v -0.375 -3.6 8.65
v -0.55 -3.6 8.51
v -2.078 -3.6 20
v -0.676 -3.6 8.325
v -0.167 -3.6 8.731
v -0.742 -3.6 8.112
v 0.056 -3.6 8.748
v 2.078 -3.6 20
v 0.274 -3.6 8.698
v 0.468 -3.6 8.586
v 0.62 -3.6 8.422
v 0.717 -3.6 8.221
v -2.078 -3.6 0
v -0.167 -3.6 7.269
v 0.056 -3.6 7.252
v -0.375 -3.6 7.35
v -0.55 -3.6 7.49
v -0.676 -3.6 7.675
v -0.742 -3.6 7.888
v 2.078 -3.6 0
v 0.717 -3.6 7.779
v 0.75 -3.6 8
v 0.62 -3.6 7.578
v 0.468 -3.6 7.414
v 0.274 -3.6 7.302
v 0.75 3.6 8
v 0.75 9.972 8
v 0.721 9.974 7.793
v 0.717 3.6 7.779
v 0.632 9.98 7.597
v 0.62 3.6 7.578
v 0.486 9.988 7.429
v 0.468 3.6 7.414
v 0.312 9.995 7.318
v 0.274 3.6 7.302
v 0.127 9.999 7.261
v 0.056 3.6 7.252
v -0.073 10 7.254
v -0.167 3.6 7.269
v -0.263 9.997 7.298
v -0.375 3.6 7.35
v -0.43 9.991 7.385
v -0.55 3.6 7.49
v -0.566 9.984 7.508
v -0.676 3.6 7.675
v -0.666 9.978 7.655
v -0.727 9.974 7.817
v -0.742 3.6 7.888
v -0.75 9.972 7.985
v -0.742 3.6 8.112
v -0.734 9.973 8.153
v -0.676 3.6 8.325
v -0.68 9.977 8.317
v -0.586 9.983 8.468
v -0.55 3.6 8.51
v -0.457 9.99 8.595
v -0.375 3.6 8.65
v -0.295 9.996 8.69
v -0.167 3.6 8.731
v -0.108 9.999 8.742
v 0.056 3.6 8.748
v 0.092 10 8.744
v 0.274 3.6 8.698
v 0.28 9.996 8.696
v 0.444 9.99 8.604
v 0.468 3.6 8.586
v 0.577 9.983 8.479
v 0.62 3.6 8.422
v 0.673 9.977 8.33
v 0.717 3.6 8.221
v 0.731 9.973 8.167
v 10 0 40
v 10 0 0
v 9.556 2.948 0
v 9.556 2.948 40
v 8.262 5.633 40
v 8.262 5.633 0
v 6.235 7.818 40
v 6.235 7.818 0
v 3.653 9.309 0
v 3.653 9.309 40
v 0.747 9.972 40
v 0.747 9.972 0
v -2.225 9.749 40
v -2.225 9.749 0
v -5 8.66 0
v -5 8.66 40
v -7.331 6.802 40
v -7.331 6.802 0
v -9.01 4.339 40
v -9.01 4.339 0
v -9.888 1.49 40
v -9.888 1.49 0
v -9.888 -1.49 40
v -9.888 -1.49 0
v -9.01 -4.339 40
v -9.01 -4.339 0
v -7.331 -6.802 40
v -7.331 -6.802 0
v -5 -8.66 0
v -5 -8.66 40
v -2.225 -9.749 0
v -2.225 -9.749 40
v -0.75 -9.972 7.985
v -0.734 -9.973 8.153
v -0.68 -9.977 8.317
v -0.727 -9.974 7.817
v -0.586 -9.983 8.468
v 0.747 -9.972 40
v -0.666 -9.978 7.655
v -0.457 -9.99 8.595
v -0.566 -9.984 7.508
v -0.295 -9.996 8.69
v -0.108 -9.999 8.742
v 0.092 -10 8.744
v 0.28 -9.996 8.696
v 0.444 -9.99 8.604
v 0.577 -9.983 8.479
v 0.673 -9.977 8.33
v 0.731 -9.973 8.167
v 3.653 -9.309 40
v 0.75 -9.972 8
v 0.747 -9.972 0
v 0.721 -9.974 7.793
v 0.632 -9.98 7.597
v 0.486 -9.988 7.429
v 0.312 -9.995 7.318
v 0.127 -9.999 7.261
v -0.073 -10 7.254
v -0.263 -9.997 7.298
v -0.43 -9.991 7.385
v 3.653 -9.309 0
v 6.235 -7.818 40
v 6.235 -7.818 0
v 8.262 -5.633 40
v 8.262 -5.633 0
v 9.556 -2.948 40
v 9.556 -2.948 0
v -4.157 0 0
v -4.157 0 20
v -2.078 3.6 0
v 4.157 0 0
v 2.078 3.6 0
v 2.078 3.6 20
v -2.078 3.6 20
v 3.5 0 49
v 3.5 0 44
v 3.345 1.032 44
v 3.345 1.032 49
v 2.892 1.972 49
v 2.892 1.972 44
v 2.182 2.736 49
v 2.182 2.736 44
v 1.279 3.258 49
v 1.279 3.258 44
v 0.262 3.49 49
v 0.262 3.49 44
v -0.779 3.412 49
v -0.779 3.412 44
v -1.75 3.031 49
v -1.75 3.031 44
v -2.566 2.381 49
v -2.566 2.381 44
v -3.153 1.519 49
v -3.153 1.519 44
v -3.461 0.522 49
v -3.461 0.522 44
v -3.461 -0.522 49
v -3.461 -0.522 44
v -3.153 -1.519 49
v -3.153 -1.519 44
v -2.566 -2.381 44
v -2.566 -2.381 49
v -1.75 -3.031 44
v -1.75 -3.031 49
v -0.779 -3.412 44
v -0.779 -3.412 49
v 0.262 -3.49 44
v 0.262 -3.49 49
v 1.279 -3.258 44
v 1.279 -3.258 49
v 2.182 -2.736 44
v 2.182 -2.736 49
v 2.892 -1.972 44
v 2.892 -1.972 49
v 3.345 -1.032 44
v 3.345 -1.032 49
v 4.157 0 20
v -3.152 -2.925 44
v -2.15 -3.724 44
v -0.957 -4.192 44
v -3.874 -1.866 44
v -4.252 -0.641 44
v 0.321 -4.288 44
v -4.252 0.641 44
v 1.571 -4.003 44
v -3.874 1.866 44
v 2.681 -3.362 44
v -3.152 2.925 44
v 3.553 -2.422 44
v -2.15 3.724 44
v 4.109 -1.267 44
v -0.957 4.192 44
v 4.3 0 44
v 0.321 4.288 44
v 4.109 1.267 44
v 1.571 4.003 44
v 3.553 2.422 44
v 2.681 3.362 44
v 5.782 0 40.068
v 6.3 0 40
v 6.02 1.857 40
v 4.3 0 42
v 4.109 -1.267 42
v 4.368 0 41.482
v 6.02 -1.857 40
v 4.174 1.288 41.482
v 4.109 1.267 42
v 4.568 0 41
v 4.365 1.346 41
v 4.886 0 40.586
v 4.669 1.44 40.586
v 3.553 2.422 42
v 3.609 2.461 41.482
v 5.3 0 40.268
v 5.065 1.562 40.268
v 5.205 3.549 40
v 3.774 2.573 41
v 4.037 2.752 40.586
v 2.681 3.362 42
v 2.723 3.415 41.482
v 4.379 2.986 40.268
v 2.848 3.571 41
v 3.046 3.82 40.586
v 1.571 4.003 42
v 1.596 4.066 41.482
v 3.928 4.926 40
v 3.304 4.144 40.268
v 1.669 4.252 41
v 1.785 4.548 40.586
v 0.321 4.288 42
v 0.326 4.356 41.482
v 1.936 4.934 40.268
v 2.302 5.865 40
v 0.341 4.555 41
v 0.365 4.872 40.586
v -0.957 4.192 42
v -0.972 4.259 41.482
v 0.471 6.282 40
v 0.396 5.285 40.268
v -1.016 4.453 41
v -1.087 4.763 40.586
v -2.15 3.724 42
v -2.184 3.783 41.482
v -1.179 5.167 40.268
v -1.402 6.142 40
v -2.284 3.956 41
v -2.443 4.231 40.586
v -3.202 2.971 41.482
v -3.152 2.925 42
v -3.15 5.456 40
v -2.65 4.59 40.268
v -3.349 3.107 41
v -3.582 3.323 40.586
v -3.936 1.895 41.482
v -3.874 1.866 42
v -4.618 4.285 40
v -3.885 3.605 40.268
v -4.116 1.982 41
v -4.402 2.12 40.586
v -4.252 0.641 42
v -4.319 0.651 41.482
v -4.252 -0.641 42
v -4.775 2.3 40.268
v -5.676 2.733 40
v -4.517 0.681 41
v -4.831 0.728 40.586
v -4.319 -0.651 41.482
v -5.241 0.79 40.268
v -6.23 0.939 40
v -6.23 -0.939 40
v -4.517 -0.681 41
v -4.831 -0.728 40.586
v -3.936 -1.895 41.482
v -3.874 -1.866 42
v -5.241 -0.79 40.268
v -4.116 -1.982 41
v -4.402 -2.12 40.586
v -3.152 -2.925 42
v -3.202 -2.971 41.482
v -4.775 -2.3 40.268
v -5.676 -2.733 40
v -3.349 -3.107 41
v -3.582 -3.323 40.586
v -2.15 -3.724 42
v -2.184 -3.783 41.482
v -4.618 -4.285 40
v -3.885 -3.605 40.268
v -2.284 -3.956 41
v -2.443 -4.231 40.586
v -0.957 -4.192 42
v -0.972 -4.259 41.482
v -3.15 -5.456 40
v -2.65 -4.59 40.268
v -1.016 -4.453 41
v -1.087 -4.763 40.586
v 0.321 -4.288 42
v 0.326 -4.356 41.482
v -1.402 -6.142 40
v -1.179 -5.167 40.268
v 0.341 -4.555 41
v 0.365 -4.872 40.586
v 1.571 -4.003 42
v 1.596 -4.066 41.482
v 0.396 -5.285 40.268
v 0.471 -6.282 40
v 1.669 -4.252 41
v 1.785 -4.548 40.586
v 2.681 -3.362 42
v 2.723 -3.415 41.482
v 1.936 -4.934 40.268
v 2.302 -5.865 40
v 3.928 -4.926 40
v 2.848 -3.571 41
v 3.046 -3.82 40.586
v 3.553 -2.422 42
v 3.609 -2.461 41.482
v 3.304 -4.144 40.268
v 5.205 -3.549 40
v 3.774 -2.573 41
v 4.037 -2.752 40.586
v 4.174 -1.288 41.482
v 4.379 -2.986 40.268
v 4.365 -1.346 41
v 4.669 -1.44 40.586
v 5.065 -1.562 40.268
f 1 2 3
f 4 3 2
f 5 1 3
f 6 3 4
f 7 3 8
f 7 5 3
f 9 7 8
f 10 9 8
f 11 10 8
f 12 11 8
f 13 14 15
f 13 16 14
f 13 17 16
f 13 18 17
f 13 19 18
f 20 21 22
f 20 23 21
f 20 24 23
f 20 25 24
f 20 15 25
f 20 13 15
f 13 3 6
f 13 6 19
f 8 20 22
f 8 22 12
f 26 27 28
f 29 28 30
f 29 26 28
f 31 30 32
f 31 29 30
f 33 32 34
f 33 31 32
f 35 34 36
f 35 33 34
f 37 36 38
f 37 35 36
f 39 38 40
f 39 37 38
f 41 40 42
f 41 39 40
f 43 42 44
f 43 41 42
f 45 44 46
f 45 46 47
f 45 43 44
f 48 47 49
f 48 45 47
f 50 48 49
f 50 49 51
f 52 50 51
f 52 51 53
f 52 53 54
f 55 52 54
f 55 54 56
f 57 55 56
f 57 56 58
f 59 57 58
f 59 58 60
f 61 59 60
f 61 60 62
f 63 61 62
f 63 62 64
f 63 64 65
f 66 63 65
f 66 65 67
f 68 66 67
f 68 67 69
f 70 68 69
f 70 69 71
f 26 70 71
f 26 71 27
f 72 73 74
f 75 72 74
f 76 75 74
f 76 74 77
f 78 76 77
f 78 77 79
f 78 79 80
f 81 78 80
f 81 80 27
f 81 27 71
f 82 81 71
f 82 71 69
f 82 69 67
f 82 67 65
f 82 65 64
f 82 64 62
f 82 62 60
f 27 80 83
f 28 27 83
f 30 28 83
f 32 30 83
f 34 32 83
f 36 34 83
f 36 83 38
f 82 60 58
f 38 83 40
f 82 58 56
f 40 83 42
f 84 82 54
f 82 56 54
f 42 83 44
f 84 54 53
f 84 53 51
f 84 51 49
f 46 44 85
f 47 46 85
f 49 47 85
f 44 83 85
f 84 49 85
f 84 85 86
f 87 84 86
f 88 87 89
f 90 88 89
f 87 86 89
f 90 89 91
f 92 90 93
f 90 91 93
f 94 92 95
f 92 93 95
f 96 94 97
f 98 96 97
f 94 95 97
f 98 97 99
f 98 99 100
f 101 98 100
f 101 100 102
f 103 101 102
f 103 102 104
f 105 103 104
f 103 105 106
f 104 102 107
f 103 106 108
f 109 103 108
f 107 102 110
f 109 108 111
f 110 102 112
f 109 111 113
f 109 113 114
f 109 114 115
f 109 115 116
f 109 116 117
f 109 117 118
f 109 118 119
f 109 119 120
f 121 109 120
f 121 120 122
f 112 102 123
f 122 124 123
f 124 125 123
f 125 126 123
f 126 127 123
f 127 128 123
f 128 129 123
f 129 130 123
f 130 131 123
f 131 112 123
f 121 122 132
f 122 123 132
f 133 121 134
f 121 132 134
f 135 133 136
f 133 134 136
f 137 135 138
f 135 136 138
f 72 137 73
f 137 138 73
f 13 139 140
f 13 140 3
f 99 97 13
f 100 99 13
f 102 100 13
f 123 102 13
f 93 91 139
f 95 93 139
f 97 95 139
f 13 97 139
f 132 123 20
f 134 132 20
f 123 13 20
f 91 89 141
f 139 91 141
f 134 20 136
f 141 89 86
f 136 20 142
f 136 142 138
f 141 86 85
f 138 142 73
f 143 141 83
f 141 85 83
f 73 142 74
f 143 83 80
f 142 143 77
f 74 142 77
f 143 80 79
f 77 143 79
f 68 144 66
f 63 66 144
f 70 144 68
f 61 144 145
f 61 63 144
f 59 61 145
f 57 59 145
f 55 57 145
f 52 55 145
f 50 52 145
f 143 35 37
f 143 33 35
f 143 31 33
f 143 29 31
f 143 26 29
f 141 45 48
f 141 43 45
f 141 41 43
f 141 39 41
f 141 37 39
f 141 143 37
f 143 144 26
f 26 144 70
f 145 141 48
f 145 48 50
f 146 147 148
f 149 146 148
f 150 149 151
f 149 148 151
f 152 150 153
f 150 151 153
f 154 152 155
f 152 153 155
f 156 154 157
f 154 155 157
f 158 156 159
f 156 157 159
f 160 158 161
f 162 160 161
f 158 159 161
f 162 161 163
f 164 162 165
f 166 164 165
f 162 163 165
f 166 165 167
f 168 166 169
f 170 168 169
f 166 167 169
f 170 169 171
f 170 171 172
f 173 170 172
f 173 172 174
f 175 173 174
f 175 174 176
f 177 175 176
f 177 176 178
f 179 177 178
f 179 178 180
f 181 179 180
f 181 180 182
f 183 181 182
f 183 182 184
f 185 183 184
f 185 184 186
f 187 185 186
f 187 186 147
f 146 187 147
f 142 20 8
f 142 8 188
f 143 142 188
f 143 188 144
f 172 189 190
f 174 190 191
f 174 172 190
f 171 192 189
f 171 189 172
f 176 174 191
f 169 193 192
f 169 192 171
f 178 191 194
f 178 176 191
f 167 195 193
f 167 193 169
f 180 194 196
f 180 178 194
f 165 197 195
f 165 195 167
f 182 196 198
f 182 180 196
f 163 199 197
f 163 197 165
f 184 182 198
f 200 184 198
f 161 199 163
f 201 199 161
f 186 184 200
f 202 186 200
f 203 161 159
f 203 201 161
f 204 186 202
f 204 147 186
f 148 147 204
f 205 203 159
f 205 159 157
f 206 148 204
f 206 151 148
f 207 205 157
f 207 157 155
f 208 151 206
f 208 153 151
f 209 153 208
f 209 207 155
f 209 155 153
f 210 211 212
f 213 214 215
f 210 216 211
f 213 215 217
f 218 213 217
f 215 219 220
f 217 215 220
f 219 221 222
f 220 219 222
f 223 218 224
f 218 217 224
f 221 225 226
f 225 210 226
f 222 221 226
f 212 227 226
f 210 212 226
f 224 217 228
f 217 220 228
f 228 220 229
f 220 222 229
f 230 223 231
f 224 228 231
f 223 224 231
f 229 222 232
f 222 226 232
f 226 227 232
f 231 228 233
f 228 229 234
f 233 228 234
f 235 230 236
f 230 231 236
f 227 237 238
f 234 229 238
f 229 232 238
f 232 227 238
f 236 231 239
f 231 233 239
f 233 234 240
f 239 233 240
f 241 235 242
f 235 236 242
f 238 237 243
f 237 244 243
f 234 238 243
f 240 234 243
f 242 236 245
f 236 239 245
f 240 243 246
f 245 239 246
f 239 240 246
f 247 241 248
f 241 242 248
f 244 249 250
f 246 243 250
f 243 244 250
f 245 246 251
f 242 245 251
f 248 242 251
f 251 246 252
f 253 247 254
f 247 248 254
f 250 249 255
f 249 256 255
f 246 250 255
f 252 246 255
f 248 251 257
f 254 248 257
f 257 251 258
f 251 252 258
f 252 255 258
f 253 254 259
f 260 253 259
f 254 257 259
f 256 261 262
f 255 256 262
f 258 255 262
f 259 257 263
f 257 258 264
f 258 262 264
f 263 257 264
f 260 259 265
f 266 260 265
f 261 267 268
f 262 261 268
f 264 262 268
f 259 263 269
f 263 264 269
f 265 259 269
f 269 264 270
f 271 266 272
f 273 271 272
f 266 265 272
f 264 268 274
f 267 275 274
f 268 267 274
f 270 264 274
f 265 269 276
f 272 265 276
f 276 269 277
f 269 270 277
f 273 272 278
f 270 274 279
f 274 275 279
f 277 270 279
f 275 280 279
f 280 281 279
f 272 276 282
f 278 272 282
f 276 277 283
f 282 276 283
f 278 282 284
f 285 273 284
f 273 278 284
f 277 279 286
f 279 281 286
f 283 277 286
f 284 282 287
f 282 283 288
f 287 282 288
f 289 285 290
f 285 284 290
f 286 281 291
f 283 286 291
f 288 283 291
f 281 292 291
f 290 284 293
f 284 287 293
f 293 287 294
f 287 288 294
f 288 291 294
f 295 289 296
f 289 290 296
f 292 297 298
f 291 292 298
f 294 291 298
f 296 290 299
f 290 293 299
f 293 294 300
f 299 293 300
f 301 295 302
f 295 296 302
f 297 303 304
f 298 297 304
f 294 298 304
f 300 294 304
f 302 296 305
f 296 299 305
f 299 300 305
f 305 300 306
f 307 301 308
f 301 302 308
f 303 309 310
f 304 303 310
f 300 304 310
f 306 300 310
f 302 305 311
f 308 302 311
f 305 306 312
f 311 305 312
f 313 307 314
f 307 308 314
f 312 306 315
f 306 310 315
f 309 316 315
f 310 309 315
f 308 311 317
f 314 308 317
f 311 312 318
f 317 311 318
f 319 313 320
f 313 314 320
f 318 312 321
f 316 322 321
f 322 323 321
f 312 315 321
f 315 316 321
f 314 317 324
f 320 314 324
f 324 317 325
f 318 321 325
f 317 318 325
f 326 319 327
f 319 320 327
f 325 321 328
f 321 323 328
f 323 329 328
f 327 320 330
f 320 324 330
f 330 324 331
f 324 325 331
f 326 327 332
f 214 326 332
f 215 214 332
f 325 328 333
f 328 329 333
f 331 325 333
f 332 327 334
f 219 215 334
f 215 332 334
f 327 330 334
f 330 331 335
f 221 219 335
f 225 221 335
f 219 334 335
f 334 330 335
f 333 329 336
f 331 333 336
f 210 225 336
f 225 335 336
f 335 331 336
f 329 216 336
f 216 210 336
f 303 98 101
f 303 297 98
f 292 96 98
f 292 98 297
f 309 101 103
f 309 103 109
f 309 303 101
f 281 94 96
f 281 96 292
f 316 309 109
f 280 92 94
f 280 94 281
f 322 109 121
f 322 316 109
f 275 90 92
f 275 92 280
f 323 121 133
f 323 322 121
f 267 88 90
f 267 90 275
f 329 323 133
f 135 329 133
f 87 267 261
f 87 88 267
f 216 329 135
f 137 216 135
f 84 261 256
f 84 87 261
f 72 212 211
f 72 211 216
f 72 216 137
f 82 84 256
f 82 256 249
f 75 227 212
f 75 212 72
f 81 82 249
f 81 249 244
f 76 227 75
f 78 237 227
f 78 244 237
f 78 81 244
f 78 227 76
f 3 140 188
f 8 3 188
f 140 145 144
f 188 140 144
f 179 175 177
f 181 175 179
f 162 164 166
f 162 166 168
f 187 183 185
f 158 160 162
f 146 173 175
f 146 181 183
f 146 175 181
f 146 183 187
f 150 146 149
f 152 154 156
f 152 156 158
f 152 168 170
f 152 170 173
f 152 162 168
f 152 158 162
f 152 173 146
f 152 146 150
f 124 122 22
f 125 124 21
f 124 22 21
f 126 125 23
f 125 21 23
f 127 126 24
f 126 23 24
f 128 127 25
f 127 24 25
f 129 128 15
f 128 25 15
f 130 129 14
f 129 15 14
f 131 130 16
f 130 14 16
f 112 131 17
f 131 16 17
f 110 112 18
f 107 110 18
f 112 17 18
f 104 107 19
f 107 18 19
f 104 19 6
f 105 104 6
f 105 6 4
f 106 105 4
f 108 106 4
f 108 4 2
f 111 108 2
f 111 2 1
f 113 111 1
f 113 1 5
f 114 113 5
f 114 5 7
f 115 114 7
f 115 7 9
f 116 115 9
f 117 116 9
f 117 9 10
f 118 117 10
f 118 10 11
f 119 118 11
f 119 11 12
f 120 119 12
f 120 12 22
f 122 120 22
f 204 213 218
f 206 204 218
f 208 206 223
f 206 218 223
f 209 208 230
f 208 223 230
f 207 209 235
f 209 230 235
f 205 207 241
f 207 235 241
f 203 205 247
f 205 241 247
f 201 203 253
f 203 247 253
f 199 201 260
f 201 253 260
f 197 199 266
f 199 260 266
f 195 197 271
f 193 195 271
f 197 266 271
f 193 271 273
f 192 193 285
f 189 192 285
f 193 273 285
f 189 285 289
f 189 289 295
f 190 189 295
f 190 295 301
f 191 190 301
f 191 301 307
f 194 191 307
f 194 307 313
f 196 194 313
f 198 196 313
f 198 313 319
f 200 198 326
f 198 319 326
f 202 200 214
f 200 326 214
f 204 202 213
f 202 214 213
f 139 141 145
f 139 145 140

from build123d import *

# Parameters (mm, degrees)
ESQUISSE1_R                  = 10
BOSS_EXTRU_1_DEPTH           = 40
ESQUISSE2_R                  = 0.75
ENL_V_MAT_EXTRU_1_DEPTH      = 40
ENL_V_MAT_EXTRU_1_DEPTH_BACK = 40
ESQUISSE3_R                  = 5.241374435
BOSS_EXTRU_2_DEPTH           = 20
ESQUISSE4_R                  = 3.5
BOSS_EXTRU_3_DEPTH           = 9
ESQUISSE5_R                  = 4.3
BOSS_EXTRU_4_DEPTH           = 4
CONG_2_R                     = 2


with BuildPart() as part:
    # Esquisse1 → Boss.-Extru.1 (new body)
    with BuildSketch(Plane.XY):
        Circle(ESQUISSE1_R)
        Polygon((4.156921938, 0), (2.078460969, 3.6), (-2.078460969, 3.6), (-4.156921938, 0), (-2.078460969, -3.6), (2.078460969, -3.6), align=None, mode=Mode.SUBTRACT)
    extrude(amount=BOSS_EXTRU_1_DEPTH)

    # Esquisse2 → Enlèv. mat.-Extru.1 (cut, two sides)
    with BuildSketch(Plane(origin=(0, 0, 0), x_dir=(1, 0, 0), z_dir=(0, 1, 0))) as enl_v_mat_extru_1_sk:
        with Locations((0, -8)):
            Circle(ESQUISSE2_R)
    extrude(amount=ENL_V_MAT_EXTRU_1_DEPTH, mode=Mode.SUBTRACT)
    extrude(enl_v_mat_extru_1_sk.sketch, amount=-ENL_V_MAT_EXTRU_1_DEPTH_BACK, mode=Mode.SUBTRACT)

    # Esquisse3 → Boss.-Extru.2 (add)
    with BuildSketch(Plane.XY.offset(40)):
        Circle(ESQUISSE3_R)
    extrude(amount=-BOSS_EXTRU_2_DEPTH)

    # Esquisse4 → Boss.-Extru.3 (add)
    with BuildSketch(Plane.XY.offset(40)):
        Circle(ESQUISSE4_R)
    extrude(amount=BOSS_EXTRU_3_DEPTH)

    # Esquisse5 → Boss.-Extru.4 (add)
    with BuildSketch(Plane.XY.offset(40)):
        Circle(ESQUISSE5_R)
    extrude(amount=BOSS_EXTRU_4_DEPTH)

    # Congé2
    cong_2_edges = [part.edges().sort_by_distance(p)[0] for p in [
        (-4.3, 0, 40),
    ]]
    fillet(cong_2_edges, radius=CONG_2_R)


solid = part.part
